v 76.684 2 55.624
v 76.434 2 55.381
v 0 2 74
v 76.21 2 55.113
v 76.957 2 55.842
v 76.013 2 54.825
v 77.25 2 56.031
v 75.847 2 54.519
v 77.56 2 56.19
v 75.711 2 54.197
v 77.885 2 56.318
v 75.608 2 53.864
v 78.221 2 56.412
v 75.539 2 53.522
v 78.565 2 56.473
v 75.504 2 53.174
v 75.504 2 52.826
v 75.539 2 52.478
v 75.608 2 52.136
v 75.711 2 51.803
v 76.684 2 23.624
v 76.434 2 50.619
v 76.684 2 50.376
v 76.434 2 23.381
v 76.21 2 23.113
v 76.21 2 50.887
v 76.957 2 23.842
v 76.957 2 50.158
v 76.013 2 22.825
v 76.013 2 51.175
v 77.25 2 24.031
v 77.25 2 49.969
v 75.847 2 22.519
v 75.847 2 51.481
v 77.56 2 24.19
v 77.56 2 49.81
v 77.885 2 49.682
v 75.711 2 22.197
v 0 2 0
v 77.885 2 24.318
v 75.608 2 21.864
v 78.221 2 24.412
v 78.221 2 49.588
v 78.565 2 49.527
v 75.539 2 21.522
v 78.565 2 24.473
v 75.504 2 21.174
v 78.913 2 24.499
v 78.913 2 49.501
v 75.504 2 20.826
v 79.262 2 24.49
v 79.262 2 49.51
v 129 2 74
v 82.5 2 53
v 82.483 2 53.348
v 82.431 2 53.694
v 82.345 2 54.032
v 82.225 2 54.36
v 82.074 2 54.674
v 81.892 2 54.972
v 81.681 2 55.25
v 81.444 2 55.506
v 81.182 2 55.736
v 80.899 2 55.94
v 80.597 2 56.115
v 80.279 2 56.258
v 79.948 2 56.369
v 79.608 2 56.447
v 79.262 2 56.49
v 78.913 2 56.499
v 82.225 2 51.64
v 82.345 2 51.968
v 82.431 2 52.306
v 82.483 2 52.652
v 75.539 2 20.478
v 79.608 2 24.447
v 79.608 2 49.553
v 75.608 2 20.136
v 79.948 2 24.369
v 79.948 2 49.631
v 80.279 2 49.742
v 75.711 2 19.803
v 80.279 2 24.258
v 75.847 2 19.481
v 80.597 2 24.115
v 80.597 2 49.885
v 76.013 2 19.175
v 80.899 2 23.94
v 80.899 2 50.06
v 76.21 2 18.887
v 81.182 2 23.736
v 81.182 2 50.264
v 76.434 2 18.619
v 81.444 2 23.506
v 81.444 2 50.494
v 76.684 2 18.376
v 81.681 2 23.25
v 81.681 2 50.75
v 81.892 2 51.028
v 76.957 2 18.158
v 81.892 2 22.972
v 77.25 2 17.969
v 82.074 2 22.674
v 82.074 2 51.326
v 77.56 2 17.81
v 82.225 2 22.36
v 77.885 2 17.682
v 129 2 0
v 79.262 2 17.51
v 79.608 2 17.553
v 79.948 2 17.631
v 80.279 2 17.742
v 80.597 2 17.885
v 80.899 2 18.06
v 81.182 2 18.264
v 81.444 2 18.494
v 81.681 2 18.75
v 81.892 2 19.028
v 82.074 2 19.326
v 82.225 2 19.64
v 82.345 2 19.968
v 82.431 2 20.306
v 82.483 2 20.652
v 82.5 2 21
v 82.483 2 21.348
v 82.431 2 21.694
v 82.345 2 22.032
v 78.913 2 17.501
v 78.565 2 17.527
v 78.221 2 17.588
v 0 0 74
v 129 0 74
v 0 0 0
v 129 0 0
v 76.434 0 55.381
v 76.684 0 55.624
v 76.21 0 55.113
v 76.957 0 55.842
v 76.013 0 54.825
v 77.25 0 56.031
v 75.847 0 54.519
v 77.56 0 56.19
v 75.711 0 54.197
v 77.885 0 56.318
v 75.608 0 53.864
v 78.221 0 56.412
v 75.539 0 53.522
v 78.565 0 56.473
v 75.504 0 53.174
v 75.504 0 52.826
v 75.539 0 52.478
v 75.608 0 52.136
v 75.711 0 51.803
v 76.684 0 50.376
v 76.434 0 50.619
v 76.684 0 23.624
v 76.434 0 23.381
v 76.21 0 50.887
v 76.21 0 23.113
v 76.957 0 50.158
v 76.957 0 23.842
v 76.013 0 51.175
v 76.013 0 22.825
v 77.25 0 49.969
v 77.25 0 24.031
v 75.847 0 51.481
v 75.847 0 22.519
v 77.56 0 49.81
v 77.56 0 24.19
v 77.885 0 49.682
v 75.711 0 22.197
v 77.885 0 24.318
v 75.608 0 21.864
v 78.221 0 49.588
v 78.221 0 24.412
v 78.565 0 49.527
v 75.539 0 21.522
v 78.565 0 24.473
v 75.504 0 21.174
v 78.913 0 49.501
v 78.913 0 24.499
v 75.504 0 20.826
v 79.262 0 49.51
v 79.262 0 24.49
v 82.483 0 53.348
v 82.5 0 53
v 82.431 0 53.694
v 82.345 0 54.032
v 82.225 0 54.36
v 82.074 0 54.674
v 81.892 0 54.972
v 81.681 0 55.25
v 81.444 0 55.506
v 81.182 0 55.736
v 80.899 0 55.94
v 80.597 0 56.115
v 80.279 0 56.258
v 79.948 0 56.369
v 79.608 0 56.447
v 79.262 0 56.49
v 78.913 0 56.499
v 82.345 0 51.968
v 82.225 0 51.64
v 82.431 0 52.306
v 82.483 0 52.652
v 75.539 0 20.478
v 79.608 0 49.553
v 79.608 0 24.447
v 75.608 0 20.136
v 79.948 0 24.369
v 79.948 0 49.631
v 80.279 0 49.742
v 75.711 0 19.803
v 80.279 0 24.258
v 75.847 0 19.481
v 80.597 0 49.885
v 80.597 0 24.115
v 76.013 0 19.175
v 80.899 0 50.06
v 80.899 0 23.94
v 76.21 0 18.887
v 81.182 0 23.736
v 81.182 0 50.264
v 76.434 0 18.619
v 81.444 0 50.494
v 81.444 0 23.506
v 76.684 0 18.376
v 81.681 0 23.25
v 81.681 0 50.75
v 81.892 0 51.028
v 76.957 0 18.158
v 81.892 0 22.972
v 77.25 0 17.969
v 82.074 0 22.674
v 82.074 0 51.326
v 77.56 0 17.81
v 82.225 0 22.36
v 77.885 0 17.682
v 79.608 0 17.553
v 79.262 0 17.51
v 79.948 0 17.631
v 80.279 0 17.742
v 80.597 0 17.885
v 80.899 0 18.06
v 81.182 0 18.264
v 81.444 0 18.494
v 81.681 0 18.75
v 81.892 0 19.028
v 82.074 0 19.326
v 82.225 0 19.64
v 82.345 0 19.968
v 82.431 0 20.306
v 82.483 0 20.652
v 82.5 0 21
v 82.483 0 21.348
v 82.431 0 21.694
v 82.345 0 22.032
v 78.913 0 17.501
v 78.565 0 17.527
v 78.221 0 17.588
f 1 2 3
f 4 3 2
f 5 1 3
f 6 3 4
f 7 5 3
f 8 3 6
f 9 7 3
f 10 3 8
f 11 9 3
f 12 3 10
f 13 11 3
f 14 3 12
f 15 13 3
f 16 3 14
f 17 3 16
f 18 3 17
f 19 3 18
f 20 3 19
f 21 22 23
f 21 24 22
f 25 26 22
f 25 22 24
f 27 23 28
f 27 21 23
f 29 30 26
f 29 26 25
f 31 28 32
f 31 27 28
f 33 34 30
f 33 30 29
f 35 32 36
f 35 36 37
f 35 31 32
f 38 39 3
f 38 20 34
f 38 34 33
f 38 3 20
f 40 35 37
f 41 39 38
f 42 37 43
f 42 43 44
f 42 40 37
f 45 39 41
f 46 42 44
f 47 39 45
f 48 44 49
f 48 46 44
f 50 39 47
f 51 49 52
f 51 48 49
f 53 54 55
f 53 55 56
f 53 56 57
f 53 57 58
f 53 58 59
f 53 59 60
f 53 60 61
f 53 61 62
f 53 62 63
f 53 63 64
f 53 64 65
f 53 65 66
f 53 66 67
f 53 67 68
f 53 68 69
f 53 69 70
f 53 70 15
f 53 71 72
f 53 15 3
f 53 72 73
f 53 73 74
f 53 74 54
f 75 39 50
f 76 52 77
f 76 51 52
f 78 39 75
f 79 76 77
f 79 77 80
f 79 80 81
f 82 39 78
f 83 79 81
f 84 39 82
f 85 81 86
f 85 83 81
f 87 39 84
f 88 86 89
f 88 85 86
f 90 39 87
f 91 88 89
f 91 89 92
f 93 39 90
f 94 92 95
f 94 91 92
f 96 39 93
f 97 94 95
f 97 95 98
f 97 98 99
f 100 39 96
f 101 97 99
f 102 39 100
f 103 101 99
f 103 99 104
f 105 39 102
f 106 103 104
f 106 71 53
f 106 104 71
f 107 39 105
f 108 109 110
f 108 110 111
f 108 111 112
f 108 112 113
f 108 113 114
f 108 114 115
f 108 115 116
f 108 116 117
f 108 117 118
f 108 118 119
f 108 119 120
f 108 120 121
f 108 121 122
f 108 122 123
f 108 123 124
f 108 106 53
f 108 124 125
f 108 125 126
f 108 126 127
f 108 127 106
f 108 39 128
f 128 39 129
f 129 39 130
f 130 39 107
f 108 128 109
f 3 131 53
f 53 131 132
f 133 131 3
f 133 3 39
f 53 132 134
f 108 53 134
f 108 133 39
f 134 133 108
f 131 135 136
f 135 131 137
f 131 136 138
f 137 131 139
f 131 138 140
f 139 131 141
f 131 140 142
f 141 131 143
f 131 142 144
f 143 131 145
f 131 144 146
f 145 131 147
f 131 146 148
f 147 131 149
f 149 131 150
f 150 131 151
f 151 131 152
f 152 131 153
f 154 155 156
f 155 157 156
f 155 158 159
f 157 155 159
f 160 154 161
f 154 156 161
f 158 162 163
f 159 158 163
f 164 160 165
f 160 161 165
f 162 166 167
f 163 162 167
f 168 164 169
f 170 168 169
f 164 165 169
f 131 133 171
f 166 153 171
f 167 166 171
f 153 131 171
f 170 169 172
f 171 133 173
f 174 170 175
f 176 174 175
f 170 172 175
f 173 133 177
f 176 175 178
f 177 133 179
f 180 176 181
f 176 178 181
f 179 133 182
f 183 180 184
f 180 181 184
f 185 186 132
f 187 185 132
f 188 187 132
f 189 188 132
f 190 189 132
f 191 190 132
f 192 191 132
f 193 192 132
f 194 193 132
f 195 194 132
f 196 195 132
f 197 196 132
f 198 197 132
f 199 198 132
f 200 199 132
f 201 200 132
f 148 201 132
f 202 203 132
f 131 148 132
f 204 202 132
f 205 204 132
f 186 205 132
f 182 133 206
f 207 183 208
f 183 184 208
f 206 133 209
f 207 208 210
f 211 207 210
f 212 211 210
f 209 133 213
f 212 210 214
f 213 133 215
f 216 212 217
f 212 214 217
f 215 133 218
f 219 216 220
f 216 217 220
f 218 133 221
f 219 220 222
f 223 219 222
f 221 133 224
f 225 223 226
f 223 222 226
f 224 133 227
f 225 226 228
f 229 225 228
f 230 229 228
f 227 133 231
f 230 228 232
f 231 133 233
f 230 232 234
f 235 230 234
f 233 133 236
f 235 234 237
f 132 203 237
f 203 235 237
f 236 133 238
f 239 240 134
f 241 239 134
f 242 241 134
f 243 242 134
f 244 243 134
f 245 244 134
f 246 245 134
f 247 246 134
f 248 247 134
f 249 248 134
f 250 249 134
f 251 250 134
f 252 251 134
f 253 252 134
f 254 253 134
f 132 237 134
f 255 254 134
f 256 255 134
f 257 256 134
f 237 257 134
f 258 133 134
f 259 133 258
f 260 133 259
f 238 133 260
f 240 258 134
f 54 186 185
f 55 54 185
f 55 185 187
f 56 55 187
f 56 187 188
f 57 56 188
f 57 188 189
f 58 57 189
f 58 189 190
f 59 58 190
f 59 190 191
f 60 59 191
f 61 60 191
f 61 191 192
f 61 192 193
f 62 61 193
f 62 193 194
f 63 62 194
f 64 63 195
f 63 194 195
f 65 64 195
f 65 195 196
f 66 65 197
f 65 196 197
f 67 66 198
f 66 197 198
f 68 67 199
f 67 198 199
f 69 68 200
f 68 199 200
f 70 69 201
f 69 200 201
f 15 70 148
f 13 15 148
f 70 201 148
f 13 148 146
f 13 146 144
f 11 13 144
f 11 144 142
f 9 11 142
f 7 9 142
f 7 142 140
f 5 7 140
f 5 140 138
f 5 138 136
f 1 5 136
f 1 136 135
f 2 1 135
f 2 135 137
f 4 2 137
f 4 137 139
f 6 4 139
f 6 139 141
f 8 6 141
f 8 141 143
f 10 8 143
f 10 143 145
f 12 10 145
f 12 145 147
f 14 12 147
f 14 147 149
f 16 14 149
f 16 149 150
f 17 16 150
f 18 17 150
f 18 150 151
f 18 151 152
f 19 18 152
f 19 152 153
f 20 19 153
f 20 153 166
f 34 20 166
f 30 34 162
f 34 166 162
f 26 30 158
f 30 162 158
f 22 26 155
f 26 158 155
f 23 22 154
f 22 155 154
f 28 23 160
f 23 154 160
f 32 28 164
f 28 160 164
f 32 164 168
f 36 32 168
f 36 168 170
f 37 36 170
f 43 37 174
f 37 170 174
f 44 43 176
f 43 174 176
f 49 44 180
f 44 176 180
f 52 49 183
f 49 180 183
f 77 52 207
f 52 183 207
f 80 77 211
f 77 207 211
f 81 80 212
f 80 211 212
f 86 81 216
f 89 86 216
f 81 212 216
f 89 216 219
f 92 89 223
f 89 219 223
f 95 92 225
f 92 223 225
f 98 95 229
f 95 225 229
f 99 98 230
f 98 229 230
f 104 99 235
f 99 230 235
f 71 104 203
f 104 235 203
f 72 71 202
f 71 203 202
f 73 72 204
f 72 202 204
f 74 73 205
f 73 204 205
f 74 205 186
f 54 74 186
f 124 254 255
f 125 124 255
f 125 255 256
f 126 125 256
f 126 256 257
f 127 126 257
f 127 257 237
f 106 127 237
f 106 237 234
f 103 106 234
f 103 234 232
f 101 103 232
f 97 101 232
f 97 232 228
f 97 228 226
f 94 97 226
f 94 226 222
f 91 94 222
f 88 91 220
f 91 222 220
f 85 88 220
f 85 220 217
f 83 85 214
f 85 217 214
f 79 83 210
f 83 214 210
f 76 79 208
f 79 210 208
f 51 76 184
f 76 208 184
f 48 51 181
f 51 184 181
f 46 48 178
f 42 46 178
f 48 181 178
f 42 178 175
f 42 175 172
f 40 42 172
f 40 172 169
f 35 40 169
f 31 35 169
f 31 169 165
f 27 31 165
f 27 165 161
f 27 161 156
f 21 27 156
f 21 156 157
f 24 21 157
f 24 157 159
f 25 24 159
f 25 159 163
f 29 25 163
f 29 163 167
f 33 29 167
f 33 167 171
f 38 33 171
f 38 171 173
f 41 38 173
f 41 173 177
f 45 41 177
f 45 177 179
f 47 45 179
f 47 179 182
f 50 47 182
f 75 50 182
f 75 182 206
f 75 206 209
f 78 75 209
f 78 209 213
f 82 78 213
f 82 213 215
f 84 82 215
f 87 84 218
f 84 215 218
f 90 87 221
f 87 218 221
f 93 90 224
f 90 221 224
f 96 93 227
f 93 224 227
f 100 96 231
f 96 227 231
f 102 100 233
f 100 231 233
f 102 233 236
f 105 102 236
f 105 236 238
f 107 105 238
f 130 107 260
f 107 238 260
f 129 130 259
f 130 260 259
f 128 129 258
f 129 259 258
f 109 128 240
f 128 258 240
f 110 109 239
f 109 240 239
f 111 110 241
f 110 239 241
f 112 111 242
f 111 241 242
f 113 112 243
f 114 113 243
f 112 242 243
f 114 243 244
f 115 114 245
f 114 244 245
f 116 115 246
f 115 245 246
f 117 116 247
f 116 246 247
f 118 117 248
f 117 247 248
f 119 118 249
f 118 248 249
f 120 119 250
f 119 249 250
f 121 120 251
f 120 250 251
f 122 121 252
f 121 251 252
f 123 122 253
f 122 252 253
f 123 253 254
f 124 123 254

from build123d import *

# Parameters (mm, degrees)
SKETCH1_W           = 129
SKETCH1_H           = 74
BOSS_EXTRUDE1_DEPTH = 2
SKETCH2_R           = 3.5
CUT_EXTRUDE1_DEPTH  = 3


with BuildPart() as part:
    # Sketch1 → Boss-Extrude1 (new body)
    with BuildSketch(Plane(origin=(0, 0, 0), x_dir=(1, 0, 0), z_dir=(0, 1, 0))):
        with Locations((64.5, -37)):
            Rectangle(SKETCH1_W, SKETCH1_H)
    extrude(amount=BOSS_EXTRUDE1_DEPTH)

    # Sketch2 → Cut-Extrude1 (cut, through all)
    with BuildSketch(Plane.XZ):
        with Locations((79, 21)):
            Circle(SKETCH2_R)
        with Locations((79, 53)):
            Circle(SKETCH2_R)
    extrude(amount=-CUT_EXTRUDE1_DEPTH, mode=Mode.SUBTRACT)


solid = part.part
